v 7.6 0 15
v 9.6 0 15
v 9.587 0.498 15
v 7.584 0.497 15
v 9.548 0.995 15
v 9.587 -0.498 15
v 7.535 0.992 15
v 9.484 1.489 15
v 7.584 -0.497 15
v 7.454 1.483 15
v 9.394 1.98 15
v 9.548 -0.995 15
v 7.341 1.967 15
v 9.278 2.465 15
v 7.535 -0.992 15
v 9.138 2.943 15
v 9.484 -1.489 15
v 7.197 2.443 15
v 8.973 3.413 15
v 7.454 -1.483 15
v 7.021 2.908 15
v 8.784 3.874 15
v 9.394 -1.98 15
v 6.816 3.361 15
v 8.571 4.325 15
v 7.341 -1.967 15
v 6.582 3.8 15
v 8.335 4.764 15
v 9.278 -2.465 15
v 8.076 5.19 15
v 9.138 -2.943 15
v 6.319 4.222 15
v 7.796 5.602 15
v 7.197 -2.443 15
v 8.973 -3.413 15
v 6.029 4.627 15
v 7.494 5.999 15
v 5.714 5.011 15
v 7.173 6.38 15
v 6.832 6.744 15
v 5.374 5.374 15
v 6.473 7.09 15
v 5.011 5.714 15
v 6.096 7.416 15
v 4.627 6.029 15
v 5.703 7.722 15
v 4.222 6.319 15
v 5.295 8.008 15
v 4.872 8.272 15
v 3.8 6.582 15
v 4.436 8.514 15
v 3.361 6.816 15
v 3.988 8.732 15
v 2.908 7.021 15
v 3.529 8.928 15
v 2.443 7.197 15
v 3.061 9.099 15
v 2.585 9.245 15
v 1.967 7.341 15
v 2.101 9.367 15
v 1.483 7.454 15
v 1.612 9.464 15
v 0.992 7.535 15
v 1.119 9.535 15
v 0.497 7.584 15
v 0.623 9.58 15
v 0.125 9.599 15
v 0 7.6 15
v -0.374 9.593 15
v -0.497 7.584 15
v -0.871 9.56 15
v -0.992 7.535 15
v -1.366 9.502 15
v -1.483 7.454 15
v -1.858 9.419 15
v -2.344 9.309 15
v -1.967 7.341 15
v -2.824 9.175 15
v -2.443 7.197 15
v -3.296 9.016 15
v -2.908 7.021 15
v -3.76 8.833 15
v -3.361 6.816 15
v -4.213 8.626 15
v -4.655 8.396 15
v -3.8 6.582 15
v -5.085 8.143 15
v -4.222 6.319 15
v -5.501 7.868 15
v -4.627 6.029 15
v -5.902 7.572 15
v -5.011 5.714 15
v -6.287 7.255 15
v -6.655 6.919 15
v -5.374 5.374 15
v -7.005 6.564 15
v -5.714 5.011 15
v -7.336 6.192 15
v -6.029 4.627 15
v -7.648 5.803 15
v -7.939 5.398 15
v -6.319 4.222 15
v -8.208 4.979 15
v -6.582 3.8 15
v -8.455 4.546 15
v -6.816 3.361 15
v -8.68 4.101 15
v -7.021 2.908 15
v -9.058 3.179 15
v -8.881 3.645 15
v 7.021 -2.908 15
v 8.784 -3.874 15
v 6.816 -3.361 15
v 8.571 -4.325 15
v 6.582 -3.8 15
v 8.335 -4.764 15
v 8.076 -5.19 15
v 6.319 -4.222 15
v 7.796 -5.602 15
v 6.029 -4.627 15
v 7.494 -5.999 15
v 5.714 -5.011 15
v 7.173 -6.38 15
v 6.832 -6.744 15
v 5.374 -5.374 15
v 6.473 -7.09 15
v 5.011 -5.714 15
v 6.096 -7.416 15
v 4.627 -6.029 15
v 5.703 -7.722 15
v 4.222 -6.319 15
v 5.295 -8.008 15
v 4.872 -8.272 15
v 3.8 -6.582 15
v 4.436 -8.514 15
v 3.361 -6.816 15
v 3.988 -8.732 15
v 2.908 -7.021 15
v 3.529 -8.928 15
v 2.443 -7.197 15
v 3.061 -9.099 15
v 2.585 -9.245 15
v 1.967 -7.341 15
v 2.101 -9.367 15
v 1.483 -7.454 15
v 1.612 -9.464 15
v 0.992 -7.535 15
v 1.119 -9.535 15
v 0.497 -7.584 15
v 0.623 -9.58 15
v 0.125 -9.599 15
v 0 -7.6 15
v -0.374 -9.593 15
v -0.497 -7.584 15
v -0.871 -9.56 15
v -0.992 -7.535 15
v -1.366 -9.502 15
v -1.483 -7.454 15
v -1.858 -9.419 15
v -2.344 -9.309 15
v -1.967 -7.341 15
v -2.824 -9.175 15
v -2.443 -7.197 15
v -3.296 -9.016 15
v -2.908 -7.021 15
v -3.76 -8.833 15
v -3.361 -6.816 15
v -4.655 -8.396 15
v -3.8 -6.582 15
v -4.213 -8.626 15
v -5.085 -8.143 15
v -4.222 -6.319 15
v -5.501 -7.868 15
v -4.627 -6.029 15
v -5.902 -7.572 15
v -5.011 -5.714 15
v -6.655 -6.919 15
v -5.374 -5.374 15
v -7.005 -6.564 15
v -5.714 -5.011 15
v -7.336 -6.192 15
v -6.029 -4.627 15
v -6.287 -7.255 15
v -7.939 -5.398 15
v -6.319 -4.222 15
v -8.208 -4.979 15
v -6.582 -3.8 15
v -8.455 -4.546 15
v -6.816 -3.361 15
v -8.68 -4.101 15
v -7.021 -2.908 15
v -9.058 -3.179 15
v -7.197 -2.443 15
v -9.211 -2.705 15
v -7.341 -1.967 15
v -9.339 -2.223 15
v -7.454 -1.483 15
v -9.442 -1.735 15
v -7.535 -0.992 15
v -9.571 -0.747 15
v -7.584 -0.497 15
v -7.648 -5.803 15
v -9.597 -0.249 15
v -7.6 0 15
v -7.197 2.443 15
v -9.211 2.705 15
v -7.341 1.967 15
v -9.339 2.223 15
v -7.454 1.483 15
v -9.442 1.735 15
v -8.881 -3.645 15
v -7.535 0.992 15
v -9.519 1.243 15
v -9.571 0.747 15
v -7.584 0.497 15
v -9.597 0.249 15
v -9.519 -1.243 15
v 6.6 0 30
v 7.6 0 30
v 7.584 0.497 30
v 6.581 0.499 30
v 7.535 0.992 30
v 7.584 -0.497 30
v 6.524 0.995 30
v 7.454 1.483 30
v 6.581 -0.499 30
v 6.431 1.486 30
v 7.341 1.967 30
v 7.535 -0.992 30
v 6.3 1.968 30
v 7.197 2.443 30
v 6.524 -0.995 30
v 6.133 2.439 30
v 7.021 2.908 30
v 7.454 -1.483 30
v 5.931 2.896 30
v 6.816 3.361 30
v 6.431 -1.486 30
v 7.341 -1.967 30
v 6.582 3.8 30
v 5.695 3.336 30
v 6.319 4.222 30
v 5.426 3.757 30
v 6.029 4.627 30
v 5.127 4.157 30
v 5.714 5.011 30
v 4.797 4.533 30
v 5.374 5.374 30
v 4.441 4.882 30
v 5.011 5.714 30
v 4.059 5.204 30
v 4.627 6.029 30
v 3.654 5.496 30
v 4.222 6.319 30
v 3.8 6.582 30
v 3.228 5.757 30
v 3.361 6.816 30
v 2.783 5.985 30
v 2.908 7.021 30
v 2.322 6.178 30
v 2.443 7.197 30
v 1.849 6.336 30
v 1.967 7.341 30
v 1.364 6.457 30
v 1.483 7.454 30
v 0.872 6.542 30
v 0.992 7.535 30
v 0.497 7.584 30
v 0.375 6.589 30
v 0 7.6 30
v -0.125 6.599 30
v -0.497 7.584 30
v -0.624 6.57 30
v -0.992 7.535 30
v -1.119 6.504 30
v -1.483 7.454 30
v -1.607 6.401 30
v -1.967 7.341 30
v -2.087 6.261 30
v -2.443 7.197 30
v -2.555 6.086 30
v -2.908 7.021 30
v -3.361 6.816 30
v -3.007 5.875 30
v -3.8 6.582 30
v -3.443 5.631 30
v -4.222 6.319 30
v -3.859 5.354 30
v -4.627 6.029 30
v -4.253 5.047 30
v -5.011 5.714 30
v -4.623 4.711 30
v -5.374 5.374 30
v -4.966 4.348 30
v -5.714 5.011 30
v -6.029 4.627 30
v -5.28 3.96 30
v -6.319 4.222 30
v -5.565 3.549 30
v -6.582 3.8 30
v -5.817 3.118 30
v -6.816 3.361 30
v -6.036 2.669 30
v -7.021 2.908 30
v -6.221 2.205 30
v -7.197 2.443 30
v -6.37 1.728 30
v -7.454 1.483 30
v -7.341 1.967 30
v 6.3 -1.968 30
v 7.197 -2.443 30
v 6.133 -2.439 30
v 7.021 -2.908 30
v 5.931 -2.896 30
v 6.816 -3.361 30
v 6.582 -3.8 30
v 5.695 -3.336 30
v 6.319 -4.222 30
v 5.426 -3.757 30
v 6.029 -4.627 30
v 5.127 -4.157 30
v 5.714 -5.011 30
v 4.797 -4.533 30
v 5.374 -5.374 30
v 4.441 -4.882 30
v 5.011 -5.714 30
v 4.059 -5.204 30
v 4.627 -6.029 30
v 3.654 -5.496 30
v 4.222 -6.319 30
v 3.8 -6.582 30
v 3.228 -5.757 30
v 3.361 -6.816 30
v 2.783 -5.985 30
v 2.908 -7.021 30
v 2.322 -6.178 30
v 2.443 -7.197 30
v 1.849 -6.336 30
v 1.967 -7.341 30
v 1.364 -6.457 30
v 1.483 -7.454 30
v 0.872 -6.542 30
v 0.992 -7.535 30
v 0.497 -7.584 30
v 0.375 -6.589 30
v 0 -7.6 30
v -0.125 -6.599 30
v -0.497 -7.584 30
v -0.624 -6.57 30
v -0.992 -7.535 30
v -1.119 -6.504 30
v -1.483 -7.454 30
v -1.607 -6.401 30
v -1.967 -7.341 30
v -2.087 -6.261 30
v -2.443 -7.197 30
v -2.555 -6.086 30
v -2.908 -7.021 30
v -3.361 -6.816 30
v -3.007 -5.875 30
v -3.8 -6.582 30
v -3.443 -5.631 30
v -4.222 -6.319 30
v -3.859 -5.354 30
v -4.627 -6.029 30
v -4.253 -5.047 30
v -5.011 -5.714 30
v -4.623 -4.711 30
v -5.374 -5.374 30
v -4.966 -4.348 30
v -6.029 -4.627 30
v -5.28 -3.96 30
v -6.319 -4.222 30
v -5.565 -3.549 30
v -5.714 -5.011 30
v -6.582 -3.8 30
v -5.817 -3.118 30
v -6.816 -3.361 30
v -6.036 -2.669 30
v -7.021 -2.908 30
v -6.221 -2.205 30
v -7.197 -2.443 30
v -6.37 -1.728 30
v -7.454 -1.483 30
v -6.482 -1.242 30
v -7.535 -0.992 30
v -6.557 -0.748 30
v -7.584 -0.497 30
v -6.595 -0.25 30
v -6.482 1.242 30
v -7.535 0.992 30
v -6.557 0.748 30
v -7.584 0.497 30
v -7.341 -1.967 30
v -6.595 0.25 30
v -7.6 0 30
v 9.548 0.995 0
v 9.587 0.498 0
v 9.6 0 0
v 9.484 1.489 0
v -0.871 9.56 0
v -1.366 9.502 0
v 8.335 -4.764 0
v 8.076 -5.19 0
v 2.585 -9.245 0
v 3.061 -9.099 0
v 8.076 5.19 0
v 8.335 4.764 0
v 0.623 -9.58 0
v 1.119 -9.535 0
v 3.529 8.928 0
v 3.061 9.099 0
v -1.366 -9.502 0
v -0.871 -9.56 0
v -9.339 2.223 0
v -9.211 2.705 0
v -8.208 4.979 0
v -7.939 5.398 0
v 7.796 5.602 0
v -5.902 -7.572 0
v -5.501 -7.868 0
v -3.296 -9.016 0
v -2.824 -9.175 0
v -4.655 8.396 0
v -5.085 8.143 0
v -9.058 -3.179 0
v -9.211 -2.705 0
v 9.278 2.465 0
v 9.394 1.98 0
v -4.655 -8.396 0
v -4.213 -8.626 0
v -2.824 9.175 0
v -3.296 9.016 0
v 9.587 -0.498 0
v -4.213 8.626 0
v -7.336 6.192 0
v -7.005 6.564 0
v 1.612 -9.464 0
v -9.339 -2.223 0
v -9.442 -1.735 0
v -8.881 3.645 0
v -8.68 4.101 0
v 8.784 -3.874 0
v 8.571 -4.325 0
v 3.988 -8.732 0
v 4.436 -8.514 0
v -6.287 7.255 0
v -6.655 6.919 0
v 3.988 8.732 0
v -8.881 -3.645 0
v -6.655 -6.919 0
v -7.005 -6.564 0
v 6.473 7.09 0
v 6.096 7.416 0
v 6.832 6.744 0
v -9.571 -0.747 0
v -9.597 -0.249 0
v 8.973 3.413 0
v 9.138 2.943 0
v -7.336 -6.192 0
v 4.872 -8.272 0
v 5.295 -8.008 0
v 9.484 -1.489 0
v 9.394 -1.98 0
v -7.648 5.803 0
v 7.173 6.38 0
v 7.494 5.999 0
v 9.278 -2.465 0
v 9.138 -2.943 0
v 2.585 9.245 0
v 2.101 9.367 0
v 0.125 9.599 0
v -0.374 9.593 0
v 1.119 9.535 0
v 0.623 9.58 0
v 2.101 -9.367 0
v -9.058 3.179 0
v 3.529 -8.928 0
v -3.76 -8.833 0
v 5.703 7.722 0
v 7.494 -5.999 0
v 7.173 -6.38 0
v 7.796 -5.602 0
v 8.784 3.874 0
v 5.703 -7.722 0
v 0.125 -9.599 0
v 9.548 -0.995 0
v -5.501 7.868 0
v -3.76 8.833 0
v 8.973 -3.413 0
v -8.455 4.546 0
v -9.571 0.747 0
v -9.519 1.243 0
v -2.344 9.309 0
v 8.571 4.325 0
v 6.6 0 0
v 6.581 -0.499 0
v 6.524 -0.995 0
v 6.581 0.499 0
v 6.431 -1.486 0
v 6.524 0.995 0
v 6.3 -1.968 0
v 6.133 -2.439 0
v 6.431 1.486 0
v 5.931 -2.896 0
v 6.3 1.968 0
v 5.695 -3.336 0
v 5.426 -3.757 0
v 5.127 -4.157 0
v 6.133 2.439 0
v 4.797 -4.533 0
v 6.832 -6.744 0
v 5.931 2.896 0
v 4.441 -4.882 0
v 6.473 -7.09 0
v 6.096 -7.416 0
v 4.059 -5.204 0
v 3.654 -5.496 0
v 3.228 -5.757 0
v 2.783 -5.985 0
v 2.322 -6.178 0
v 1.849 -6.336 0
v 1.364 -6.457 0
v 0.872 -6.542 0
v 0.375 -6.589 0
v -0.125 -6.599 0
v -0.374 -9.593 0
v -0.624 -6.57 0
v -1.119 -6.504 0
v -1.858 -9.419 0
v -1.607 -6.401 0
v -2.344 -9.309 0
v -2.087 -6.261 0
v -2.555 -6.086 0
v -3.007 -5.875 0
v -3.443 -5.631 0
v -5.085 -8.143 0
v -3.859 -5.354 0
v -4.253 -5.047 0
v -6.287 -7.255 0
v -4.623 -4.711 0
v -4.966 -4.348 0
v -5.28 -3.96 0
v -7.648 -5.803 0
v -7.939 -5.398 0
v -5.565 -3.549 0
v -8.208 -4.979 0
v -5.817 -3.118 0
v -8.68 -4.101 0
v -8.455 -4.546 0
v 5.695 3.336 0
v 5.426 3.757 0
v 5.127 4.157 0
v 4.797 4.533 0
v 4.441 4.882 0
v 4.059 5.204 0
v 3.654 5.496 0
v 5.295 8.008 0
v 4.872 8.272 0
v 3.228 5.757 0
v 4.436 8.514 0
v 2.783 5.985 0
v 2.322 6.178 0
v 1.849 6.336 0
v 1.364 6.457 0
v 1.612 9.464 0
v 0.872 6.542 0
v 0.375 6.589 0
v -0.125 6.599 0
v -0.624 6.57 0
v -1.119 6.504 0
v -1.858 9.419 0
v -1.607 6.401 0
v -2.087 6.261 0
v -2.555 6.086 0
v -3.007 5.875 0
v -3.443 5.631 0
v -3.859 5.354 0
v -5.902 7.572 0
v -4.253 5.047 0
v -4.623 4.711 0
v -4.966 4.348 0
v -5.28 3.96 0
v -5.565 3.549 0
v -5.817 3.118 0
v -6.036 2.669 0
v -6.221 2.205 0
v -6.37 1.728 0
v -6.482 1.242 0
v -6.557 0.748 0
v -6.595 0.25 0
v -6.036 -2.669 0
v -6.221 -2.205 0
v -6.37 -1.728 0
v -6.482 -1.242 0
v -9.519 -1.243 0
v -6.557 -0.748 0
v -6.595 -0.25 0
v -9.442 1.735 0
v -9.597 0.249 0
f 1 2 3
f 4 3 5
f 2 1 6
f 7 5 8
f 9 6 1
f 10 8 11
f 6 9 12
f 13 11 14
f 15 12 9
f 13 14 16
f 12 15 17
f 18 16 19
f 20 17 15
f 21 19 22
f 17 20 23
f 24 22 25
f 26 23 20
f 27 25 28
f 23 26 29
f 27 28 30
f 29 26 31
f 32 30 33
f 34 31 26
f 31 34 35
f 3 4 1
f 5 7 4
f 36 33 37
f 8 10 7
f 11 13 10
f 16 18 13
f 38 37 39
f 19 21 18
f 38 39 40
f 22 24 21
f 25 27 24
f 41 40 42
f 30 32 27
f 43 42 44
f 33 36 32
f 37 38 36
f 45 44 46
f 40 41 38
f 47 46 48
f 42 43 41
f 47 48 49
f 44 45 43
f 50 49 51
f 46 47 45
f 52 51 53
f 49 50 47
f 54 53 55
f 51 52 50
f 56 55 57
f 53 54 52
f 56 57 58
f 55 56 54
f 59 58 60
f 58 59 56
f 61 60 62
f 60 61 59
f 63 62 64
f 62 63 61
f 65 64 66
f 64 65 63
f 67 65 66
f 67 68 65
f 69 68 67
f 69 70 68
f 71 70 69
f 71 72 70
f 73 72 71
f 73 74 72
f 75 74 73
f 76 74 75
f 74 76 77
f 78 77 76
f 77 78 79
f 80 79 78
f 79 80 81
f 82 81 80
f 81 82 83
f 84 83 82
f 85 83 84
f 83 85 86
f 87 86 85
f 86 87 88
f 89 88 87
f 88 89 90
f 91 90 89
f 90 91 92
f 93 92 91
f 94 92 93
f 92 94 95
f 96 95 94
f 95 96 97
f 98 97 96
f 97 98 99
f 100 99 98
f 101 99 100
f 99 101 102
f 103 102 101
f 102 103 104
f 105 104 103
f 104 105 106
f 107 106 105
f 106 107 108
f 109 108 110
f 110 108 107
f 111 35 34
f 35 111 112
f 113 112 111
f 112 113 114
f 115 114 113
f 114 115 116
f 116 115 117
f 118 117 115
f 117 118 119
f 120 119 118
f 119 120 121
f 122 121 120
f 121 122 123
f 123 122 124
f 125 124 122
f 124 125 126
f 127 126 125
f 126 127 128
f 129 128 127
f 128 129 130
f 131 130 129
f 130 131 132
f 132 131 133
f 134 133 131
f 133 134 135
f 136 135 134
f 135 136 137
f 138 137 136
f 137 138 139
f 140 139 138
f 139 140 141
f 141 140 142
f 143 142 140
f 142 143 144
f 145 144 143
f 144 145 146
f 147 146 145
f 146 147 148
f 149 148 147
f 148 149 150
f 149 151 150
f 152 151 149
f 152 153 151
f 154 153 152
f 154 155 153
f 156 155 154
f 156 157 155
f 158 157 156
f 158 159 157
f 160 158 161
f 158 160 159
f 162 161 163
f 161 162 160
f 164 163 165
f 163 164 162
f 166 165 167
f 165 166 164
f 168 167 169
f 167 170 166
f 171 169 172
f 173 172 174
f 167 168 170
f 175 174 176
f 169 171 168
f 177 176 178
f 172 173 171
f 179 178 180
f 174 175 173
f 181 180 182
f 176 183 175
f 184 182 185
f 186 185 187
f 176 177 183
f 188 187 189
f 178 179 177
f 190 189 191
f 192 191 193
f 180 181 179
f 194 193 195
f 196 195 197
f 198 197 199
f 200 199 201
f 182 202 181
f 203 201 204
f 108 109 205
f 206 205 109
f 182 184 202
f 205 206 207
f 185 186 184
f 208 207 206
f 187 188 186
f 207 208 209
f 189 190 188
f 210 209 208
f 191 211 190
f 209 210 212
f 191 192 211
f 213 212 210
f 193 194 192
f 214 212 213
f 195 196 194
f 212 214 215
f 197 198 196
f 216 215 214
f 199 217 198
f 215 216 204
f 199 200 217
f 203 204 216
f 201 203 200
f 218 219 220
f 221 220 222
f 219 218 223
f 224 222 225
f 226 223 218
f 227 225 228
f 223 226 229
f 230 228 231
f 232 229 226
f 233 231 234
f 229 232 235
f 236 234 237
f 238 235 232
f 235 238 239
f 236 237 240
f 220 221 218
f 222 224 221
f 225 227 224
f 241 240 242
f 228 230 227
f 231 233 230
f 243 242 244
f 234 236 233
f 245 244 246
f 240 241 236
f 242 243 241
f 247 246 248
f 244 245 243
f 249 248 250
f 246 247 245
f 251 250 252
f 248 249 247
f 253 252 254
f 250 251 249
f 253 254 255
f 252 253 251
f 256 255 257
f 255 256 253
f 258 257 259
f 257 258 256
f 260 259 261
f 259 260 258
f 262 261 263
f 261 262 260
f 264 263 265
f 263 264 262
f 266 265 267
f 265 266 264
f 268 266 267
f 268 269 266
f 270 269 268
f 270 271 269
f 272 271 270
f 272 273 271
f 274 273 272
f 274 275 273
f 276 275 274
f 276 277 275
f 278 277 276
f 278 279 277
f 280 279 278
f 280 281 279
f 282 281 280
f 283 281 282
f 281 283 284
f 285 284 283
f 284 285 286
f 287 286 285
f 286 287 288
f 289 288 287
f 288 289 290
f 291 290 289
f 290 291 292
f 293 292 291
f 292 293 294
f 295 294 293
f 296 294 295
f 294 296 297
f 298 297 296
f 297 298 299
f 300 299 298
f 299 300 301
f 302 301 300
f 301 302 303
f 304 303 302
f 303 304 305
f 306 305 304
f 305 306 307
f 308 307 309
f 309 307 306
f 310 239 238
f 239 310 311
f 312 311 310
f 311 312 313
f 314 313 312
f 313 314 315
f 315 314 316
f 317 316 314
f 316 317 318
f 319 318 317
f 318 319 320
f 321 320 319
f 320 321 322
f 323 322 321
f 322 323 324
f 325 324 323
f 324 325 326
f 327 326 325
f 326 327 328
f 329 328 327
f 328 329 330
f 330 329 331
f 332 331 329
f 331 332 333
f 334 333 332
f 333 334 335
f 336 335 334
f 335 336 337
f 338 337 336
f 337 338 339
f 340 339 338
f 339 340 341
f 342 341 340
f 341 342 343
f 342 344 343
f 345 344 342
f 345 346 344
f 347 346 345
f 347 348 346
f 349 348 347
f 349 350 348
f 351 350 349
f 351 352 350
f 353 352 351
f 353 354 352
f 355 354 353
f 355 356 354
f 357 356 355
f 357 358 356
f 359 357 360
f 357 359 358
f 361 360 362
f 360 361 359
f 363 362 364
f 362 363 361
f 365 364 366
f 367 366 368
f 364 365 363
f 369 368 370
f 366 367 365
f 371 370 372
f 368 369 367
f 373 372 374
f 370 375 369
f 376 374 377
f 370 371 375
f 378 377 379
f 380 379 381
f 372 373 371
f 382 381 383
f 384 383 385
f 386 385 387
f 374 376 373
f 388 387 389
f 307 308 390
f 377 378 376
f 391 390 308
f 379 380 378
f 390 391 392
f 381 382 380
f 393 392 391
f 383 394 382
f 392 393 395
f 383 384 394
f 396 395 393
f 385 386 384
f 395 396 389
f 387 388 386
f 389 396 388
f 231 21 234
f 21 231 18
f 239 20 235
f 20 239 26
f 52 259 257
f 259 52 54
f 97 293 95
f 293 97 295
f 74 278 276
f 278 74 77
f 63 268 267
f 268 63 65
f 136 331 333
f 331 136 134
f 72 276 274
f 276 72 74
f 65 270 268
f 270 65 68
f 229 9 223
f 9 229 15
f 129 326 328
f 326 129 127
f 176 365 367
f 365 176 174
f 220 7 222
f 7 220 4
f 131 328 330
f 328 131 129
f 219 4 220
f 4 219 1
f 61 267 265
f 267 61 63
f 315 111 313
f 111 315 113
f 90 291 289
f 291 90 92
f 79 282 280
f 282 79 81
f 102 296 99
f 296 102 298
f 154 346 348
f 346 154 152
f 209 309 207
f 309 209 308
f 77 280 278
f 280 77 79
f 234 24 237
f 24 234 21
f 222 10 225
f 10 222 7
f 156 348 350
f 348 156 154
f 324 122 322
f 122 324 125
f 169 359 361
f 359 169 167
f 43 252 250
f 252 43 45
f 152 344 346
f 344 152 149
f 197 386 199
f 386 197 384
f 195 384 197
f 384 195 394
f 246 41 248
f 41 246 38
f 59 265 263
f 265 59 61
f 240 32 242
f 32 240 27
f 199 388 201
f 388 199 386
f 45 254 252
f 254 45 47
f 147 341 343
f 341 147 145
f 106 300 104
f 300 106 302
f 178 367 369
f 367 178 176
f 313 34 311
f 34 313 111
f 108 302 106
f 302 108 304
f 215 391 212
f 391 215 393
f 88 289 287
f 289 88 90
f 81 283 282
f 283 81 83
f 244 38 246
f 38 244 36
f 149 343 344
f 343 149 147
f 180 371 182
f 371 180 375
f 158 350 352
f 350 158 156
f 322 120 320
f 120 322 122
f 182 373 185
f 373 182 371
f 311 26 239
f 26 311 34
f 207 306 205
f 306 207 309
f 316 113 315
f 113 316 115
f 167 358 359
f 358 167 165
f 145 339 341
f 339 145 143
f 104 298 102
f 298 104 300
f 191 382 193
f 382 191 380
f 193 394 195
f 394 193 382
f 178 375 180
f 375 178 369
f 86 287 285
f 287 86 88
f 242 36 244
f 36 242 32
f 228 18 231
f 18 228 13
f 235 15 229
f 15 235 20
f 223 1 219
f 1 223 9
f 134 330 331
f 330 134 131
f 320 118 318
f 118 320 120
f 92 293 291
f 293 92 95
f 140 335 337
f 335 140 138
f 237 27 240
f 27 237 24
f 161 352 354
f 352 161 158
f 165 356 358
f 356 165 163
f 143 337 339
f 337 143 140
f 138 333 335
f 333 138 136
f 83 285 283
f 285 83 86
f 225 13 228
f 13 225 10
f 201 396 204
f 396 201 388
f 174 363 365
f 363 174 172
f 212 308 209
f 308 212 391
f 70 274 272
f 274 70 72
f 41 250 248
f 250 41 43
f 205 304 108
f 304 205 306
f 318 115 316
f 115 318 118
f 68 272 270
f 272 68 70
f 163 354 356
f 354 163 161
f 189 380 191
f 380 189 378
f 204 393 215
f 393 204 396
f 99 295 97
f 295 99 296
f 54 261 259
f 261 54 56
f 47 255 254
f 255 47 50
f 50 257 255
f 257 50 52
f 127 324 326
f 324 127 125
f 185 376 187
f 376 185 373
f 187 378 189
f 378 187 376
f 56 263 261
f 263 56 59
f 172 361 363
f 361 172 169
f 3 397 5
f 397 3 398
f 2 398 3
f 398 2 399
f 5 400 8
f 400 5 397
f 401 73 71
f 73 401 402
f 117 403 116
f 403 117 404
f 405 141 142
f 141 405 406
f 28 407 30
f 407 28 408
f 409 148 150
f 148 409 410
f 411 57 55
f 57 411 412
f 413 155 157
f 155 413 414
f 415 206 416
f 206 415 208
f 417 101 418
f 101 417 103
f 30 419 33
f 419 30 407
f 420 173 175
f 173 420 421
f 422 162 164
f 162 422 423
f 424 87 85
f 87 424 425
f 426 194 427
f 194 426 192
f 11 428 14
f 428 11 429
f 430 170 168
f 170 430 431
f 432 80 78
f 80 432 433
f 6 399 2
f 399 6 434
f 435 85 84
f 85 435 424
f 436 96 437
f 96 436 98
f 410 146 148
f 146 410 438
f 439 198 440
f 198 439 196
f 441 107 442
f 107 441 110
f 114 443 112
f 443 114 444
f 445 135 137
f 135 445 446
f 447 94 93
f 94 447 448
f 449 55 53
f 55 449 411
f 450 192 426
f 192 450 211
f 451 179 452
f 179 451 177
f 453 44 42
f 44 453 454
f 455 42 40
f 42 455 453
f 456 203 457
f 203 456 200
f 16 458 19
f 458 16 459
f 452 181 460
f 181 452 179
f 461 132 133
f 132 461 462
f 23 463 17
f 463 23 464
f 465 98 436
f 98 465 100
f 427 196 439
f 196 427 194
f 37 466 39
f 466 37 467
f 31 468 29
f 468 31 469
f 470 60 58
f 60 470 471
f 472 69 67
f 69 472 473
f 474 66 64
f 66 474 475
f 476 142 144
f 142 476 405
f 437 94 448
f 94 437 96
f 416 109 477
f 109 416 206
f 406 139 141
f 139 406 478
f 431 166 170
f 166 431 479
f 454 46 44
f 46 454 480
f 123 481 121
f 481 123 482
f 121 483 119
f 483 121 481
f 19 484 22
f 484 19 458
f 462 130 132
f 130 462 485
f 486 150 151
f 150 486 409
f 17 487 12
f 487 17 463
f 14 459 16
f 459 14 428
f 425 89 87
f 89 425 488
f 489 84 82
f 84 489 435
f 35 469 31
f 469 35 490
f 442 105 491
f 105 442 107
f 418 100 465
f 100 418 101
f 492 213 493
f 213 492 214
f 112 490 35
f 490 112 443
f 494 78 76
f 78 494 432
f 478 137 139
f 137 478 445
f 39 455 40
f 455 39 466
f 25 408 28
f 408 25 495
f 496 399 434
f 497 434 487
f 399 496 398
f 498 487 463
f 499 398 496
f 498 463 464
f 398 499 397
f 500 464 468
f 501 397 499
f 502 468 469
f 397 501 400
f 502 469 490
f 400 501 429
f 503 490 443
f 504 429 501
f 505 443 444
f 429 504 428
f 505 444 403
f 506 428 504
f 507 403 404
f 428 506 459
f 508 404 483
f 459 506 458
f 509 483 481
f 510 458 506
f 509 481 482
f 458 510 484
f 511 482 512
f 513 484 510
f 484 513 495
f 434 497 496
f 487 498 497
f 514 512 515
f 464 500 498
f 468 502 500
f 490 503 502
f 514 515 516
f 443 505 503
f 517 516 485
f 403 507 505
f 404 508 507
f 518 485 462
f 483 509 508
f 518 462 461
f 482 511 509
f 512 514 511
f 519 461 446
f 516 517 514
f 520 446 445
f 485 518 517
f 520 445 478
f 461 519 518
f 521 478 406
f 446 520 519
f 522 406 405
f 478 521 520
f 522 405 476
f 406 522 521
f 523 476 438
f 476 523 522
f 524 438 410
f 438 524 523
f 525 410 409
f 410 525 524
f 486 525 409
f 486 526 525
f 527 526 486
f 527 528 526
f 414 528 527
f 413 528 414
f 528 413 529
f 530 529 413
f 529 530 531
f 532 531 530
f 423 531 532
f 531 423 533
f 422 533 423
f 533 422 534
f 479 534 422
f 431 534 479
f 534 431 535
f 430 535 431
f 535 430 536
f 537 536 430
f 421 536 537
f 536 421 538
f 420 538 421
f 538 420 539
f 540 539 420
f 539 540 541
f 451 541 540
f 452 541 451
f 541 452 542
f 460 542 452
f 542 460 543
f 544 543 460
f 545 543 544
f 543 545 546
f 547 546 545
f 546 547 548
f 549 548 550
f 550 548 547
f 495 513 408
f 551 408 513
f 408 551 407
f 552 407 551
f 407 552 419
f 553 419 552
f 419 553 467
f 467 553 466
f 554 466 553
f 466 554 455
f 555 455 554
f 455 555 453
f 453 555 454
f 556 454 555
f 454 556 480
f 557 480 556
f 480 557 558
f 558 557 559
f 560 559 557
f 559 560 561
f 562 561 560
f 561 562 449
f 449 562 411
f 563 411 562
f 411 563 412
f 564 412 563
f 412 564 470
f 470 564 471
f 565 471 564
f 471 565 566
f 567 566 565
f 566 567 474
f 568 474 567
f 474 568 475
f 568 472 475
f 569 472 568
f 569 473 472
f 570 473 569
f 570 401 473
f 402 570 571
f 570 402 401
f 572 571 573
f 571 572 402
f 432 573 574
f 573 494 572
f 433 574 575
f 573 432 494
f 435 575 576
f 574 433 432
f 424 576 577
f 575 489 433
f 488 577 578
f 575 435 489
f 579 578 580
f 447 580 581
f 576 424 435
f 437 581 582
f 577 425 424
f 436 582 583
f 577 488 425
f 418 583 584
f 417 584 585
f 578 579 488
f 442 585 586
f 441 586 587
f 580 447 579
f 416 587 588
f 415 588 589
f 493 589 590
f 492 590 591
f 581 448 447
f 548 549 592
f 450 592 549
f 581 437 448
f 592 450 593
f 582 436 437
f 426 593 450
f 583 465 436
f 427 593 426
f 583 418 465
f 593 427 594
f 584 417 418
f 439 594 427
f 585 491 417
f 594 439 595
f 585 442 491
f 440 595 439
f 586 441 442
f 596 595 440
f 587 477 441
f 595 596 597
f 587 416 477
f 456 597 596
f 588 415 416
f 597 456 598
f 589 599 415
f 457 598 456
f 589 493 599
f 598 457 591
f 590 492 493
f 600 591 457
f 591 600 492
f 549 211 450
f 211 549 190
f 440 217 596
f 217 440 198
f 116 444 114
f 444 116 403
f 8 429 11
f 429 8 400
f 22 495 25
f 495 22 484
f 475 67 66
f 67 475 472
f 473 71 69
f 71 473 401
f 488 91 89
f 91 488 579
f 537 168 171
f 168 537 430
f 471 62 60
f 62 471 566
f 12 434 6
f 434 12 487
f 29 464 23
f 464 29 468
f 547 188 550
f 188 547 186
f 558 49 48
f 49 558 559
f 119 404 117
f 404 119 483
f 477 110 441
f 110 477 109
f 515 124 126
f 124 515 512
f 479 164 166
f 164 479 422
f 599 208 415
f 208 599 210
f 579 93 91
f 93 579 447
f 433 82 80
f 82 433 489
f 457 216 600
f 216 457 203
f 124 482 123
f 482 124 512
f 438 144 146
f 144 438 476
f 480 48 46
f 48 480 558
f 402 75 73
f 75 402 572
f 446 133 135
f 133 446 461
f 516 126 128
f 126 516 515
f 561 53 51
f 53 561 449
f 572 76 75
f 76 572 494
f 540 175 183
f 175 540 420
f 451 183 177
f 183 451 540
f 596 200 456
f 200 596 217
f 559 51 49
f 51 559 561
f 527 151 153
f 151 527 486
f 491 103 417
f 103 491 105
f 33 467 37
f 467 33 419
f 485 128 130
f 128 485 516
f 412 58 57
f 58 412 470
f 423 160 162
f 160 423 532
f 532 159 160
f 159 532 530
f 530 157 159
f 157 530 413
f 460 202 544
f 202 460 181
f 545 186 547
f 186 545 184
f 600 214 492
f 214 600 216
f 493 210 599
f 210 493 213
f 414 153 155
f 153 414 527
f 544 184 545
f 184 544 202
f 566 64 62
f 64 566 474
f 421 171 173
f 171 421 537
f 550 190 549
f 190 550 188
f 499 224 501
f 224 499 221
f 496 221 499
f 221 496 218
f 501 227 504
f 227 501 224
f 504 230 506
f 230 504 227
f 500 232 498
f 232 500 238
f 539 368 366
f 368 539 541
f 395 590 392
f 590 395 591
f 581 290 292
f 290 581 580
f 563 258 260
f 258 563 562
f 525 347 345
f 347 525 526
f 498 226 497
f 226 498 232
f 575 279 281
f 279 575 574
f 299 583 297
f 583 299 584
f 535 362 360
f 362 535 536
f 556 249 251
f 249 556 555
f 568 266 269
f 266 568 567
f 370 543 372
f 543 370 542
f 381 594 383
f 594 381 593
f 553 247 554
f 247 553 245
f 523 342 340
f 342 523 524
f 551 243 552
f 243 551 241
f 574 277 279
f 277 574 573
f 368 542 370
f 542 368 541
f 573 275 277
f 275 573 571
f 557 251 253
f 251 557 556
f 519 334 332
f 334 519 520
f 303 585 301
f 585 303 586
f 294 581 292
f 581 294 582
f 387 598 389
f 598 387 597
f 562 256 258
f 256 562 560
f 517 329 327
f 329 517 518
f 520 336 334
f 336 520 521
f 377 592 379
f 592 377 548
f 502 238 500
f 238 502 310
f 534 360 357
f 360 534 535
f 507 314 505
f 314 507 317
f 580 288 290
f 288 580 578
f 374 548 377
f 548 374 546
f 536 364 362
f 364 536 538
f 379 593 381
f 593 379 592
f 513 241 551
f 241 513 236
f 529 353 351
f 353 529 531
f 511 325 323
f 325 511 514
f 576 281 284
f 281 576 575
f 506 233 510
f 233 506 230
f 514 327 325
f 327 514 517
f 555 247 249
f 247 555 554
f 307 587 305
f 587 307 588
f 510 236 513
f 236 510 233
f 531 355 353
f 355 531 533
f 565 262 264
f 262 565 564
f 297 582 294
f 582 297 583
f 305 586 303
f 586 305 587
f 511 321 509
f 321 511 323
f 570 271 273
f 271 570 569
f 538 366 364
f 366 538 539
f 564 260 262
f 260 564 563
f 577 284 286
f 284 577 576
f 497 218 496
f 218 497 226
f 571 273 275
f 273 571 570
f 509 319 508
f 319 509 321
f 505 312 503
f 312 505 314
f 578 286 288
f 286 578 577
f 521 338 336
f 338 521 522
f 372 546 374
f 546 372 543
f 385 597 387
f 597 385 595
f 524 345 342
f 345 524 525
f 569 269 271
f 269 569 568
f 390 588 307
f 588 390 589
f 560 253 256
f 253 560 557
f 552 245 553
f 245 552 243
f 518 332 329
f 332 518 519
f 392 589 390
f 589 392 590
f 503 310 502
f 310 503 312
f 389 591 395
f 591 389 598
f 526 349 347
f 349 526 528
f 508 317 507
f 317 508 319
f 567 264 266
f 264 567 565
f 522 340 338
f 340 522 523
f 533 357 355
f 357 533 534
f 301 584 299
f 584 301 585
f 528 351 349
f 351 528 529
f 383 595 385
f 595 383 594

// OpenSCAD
// This program renders an adaptor for printing in pla. An extra 0.2 mm is added on for shrinkage to all non z dimentions.
//All Dimentions are in mm
module Circular_Adaptor (Bigger_D, Smaller_D, Length){

First_Diameter =  Smaller_D +0.2 ;

Second_Diameter =   Bigger_D +0.2 ; 

Hole_Diameter = First_Diameter - 2;
Total_height = Length;

// special variables for the properties of circular objects
$fa = 0.01;
$fs = 0.5;

difference(){    
cylinder(d = Second_Diameter , h = Total_height);
cylinder(d = Hole_Diameter , h = Total_height);
    
translate([0,0,Total_height - (Total_height/2)])
difference(){
cylinder( d= Second_Diameter + 4 , Total_height/2);
cylinder( d= First_Diameter , Total_height/2);   
}  
}

}

Circular_Adaptor (19,15,30);
